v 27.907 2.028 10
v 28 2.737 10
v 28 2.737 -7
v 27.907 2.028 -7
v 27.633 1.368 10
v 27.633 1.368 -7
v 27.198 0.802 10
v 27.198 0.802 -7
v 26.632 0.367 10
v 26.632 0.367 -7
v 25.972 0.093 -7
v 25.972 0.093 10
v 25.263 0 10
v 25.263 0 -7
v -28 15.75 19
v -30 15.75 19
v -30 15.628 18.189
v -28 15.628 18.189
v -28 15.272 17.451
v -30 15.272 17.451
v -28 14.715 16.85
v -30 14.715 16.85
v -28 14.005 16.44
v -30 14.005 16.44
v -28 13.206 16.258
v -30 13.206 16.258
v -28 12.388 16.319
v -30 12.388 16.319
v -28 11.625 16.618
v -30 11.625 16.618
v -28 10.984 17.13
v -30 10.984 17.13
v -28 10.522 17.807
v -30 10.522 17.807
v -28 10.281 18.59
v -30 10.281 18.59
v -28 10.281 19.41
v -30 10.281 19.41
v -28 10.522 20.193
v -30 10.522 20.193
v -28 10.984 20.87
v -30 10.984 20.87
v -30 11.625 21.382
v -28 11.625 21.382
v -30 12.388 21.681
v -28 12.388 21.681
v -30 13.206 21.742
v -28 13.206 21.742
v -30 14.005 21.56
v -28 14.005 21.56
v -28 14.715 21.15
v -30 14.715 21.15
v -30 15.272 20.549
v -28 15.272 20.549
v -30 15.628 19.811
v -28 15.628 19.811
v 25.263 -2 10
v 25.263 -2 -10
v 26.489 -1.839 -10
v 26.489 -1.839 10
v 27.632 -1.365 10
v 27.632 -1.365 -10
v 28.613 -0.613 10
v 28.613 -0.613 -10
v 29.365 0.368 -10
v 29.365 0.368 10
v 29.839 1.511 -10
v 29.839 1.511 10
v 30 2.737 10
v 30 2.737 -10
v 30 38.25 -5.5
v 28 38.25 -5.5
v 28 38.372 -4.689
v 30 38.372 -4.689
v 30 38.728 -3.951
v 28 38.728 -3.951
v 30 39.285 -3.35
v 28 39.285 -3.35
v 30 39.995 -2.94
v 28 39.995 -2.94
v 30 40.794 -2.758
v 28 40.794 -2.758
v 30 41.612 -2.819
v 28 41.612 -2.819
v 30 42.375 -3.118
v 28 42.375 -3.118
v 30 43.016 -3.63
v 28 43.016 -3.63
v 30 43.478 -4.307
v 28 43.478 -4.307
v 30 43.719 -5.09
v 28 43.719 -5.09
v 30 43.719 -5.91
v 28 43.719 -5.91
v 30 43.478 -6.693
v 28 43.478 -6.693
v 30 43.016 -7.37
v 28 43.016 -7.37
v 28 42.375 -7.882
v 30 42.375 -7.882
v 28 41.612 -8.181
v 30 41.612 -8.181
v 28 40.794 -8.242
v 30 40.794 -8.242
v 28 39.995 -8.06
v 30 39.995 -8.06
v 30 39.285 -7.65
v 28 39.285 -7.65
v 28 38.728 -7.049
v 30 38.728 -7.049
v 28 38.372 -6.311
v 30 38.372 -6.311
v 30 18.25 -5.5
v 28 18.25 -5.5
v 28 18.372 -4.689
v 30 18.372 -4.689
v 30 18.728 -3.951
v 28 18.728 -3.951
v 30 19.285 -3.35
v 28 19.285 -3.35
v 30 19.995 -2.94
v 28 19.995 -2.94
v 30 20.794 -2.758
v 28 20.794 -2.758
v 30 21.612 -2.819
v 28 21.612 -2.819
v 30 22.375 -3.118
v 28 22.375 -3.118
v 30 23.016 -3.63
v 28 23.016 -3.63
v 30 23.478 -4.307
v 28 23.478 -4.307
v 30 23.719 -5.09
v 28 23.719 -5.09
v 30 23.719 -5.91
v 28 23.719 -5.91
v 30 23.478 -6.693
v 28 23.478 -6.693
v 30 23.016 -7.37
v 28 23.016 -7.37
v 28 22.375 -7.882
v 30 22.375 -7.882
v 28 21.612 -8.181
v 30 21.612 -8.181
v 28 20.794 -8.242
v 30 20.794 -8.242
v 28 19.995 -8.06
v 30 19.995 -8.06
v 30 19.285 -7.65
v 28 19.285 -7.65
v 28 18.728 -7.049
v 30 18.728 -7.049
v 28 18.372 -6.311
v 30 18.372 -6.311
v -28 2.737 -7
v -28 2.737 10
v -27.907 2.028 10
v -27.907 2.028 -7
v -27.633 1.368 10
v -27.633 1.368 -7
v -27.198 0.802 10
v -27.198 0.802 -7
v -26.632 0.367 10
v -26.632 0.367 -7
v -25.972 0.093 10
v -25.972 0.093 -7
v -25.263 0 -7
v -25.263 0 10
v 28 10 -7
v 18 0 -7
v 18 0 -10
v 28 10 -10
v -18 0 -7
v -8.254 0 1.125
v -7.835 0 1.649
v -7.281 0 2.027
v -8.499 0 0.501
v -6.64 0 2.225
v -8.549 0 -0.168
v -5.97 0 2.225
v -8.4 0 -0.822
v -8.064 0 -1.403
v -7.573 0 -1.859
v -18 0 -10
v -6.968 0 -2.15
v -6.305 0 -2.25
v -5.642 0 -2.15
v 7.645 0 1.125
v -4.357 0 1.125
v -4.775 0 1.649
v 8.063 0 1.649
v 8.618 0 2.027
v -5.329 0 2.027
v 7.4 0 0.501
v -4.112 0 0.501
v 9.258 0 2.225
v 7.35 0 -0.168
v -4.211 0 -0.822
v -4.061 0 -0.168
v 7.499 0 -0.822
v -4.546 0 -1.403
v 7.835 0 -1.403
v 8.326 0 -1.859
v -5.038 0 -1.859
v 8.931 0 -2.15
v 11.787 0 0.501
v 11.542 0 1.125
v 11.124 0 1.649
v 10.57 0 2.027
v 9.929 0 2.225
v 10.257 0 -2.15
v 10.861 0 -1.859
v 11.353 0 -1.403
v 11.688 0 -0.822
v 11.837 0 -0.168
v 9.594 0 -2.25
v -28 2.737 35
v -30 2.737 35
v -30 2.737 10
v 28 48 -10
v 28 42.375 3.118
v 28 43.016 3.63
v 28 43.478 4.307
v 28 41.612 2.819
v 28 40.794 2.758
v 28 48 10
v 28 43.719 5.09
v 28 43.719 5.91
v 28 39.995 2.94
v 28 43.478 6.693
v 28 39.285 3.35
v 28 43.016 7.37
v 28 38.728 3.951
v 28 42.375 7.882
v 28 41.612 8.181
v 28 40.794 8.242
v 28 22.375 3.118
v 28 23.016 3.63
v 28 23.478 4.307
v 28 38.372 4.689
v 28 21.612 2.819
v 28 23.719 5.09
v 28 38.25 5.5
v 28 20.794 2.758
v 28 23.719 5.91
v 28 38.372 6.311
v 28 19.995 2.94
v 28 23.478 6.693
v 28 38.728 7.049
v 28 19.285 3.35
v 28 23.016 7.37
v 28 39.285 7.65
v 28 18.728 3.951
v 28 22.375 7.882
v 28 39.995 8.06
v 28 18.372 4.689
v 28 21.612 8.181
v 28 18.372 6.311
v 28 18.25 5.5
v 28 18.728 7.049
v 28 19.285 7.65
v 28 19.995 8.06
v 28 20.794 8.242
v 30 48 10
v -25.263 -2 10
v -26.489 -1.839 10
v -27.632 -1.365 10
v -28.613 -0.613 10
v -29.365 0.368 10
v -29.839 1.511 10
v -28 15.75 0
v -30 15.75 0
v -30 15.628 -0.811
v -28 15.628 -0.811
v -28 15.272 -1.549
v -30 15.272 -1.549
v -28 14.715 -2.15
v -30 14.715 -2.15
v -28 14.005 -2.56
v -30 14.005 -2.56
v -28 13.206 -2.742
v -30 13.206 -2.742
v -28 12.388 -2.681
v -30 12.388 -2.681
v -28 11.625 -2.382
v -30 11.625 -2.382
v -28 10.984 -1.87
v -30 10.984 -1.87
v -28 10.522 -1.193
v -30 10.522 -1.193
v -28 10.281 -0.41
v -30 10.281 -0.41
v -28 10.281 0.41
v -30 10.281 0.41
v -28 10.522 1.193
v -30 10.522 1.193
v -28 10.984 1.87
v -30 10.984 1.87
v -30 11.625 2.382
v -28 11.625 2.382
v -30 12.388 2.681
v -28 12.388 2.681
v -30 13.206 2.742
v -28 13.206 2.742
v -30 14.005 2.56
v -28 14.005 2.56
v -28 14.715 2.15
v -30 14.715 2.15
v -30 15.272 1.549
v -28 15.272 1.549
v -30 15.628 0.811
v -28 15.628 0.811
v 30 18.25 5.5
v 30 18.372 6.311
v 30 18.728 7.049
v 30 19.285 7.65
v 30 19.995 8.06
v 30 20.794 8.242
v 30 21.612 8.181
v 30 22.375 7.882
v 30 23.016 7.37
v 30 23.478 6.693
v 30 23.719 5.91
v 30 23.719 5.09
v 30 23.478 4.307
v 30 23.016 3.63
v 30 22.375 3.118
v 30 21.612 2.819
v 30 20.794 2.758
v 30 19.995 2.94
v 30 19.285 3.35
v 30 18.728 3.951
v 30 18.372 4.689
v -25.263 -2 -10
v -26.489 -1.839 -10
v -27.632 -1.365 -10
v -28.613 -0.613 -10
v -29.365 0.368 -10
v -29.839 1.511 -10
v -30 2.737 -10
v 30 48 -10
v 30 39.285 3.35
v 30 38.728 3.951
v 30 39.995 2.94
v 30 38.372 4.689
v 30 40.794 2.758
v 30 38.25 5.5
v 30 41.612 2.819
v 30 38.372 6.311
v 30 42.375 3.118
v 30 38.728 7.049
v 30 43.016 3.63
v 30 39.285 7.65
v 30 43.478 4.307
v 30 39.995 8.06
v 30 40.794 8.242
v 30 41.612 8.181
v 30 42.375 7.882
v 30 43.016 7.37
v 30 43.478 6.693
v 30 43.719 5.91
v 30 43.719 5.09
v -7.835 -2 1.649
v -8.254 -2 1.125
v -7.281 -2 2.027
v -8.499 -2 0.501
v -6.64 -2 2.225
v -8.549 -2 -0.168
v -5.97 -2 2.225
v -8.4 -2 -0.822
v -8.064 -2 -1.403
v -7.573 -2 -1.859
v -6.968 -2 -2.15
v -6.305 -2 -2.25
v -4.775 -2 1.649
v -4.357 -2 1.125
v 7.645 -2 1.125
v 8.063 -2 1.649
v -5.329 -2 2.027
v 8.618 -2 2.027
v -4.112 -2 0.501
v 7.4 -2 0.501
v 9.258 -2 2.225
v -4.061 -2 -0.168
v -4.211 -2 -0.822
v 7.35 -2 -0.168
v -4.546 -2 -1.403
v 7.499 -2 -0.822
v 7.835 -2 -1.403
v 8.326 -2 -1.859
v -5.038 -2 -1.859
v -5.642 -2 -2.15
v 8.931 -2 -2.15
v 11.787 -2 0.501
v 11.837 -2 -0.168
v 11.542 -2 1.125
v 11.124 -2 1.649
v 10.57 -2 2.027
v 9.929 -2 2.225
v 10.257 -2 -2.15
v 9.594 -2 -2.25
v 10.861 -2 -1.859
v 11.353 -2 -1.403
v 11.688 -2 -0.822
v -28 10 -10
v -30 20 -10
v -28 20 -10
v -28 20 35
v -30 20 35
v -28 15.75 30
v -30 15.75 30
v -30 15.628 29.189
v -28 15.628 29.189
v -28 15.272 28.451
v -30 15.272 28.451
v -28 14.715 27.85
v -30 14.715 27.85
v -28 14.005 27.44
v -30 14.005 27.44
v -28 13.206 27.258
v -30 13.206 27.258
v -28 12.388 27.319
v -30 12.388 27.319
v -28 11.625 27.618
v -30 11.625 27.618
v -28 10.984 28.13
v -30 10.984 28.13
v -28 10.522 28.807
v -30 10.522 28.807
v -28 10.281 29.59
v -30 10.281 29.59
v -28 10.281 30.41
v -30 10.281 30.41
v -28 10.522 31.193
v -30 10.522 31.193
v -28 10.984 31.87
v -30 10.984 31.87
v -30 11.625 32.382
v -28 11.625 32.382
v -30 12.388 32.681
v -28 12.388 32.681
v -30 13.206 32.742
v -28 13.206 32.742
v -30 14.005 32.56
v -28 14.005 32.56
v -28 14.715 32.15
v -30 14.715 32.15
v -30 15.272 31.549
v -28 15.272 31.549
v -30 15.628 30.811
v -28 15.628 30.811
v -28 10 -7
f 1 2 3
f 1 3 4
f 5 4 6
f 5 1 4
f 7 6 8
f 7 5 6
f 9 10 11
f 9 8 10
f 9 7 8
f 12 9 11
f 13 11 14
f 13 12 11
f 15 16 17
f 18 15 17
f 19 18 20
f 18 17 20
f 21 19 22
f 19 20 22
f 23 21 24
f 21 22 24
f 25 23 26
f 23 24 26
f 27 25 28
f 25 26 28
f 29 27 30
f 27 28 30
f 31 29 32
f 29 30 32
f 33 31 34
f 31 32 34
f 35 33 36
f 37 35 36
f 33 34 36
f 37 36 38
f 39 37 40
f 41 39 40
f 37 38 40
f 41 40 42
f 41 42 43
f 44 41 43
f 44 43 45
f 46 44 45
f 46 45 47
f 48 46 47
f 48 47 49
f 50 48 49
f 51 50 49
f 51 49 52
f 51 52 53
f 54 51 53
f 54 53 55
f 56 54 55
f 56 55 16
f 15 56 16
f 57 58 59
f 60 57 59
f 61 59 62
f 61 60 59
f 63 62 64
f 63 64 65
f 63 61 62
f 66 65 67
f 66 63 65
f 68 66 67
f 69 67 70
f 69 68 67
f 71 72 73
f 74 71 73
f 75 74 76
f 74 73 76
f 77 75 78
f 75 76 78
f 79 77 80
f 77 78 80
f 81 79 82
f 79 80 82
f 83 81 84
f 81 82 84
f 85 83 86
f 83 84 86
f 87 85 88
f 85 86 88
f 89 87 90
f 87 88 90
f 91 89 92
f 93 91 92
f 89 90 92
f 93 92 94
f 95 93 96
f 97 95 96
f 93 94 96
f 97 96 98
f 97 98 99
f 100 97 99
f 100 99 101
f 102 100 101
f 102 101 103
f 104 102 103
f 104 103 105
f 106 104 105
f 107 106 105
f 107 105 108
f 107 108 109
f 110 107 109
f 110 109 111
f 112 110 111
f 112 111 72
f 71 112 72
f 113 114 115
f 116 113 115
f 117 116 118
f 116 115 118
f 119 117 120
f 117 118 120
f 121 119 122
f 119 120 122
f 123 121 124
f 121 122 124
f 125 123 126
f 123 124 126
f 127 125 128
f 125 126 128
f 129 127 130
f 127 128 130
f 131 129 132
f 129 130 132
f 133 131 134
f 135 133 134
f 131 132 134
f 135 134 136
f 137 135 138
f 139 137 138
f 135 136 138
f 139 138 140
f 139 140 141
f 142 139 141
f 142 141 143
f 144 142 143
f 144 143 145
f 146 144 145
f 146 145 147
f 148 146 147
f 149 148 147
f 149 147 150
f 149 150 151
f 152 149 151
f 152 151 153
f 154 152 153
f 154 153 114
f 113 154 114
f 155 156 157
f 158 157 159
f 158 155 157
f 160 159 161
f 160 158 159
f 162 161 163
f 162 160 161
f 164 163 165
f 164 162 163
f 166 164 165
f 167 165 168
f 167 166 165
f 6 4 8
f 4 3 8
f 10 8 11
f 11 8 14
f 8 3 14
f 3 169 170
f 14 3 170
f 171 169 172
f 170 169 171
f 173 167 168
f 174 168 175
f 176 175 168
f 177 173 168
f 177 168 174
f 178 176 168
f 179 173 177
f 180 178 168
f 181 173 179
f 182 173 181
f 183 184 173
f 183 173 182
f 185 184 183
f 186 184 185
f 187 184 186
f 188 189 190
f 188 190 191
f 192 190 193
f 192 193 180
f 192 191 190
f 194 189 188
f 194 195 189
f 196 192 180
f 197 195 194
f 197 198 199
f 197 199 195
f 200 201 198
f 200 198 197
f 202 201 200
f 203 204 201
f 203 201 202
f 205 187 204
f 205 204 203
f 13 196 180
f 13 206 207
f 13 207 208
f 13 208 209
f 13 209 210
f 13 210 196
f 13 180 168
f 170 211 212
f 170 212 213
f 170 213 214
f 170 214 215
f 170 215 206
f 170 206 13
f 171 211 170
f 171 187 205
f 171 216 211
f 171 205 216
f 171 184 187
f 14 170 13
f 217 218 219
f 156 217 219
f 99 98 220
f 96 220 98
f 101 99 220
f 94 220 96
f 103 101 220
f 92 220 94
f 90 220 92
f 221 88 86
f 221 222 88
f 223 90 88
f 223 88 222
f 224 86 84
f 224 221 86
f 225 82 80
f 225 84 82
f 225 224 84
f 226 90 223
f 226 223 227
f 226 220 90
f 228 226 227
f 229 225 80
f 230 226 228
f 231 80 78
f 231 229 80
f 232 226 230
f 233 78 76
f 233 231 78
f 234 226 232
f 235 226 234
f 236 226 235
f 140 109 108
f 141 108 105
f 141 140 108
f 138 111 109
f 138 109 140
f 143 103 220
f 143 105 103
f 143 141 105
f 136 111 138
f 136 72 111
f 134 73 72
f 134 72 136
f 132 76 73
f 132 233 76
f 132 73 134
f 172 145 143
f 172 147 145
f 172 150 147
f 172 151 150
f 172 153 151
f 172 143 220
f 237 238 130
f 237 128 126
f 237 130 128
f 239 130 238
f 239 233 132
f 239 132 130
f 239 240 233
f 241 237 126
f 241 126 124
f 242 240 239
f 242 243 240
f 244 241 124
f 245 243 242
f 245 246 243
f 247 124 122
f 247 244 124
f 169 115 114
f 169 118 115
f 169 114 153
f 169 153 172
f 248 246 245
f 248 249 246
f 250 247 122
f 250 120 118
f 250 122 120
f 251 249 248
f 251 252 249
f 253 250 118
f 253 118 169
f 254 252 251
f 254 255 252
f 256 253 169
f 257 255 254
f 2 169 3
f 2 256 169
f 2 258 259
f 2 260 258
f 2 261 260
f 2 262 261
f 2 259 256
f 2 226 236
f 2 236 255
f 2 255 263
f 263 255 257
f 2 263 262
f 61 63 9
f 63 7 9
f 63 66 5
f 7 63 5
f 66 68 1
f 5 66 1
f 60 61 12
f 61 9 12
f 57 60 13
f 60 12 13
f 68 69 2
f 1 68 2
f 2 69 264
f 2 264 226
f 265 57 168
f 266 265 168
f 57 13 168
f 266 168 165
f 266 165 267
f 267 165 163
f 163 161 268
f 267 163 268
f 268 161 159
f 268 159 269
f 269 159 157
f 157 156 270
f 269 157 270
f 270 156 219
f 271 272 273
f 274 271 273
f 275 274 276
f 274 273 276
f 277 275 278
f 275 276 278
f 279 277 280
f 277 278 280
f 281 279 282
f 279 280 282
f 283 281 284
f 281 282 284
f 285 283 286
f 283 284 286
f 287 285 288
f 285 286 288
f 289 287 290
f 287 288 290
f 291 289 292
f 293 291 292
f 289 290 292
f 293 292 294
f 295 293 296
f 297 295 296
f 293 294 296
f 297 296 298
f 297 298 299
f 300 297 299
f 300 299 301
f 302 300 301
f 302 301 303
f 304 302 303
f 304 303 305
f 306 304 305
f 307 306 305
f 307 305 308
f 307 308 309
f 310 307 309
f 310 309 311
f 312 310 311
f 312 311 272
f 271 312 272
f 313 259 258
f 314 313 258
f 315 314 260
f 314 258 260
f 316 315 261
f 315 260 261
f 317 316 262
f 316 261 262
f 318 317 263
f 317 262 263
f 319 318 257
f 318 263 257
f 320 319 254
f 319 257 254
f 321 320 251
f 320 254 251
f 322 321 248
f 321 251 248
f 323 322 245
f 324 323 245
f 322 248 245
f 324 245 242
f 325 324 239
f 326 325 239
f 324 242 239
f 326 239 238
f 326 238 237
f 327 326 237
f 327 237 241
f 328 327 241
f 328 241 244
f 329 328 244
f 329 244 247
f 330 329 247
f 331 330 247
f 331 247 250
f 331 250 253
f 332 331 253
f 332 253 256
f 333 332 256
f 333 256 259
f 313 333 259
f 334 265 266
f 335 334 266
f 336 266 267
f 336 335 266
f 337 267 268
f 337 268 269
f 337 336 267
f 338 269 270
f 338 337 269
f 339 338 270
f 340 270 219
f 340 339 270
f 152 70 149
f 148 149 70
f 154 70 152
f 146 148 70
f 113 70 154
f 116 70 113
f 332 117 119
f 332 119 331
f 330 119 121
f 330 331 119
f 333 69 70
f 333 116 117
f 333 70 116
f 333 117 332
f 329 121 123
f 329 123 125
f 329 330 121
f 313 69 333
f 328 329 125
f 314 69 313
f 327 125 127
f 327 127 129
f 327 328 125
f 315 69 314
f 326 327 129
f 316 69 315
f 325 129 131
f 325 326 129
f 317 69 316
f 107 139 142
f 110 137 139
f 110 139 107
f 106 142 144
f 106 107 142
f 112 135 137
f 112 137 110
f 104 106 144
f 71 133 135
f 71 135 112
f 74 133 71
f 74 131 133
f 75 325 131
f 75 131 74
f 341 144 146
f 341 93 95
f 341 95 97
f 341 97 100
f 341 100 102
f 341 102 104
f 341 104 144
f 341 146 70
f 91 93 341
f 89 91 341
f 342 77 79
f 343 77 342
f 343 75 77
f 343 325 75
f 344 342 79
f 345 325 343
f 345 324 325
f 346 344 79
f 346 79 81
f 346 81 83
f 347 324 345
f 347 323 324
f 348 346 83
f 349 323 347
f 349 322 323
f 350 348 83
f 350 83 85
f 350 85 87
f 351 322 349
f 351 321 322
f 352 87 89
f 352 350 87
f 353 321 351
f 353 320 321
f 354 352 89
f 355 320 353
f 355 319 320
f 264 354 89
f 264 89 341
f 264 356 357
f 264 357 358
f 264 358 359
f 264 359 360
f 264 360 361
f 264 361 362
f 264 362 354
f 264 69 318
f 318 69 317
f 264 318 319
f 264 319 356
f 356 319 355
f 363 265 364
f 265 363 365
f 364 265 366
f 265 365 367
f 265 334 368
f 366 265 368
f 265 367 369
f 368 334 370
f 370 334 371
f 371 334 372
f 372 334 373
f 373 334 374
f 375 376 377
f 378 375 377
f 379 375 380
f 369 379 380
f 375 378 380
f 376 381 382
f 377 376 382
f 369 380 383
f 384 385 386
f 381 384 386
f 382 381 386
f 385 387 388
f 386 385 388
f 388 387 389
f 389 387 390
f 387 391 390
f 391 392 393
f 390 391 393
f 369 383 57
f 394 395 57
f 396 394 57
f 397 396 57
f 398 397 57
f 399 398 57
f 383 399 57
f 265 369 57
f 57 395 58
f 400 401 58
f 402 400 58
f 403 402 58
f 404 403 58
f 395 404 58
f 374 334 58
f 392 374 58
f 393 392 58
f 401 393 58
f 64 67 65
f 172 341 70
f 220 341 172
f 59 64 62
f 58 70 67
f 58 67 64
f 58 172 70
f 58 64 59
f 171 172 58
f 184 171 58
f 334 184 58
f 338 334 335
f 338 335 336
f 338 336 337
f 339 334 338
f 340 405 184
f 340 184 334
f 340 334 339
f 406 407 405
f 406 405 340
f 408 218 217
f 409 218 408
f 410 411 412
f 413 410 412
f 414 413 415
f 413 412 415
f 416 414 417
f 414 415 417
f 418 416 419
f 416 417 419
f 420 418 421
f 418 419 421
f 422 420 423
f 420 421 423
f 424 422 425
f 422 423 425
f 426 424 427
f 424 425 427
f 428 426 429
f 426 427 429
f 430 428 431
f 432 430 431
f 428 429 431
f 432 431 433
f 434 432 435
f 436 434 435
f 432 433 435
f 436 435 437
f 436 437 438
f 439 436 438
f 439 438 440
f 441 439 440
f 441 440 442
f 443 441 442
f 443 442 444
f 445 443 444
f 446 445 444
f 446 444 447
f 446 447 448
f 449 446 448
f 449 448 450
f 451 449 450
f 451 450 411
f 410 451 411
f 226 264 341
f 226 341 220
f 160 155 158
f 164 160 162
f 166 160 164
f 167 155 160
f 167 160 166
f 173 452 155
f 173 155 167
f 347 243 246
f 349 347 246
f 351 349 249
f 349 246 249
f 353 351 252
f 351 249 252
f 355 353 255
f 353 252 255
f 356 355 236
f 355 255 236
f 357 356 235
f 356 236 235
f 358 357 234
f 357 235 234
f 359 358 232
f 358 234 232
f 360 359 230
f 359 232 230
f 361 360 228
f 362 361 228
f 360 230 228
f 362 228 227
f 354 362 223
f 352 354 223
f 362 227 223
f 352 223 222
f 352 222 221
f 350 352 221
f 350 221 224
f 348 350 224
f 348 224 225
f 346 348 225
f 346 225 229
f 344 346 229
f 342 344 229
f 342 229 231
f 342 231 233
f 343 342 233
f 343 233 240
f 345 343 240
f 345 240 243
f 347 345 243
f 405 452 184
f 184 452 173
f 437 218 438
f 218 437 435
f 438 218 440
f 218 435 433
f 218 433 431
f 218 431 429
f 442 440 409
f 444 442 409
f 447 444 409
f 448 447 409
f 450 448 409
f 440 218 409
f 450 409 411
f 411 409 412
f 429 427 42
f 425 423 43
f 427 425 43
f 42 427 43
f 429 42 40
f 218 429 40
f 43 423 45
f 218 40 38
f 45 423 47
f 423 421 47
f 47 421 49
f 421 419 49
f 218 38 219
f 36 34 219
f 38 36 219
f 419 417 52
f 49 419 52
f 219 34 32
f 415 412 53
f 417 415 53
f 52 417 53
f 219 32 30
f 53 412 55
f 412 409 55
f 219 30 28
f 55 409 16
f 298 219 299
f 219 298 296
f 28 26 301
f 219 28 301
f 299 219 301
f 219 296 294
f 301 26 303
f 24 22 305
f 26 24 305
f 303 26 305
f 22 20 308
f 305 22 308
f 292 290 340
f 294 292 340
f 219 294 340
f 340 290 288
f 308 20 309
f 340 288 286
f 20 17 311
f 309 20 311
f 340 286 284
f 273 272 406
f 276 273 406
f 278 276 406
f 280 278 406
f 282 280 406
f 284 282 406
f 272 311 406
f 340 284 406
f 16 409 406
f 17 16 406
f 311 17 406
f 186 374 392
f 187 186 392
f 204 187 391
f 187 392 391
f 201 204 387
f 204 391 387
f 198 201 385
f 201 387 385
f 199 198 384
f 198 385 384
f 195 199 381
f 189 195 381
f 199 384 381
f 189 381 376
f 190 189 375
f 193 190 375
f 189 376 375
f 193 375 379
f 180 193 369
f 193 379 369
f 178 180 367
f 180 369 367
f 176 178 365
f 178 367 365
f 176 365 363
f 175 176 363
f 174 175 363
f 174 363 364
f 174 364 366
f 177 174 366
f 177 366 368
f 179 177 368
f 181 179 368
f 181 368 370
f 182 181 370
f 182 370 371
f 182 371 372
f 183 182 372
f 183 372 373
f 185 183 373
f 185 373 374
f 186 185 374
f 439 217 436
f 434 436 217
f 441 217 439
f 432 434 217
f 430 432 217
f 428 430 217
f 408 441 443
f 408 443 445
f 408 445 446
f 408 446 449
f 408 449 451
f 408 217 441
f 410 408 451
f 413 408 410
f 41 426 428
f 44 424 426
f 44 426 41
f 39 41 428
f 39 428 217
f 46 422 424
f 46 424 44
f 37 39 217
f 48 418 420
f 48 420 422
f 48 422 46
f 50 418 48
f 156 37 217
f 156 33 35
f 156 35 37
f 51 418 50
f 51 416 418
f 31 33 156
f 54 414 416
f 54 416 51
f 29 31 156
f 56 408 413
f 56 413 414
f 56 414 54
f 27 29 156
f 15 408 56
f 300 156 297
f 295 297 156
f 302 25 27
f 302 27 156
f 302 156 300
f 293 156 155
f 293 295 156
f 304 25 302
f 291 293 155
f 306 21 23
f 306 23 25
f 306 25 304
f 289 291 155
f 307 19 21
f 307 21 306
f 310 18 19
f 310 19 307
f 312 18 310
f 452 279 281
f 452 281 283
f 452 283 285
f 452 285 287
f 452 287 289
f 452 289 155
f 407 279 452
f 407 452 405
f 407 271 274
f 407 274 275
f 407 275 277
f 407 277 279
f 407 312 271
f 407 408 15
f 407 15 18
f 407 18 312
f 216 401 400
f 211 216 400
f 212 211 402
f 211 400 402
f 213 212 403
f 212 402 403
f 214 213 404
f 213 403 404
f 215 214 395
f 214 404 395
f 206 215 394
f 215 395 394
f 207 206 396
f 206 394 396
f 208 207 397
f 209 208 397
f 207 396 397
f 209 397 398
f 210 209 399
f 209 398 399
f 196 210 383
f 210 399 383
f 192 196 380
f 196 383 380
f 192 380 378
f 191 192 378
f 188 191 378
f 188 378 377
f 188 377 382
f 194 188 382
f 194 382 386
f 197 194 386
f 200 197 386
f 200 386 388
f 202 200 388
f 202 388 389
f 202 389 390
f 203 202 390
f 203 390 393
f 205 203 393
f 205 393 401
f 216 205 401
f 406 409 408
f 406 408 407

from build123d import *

# Parameters (mm, degrees)
SKETCH_1_W                         = 60
SKETCH_1_H                         = 20
SM_BASE_FLANGE_1_DEPTH             = 2
SM_EDGE_FLANGE_1_STRIP_W           = 13.4732
SM_EDGE_FLANGE_1_STRIP_H           = 2
SM_EDGE_FLANGE_1_STRIP_CUT_DEPTH   = 20
SM_EDGE_FLANGE_1_STRIP_2_W         = 13.4732
SM_EDGE_FLANGE_1_STRIP_2_H         = 2
SM_EDGE_FLANGE_1_STRIP_CUT_2_DEPTH = 20
SM_EDGE_FLANGE_1_DEPTH             = 20
SM_EDGE_FLANGE_1_BEND_DEPTH        = 20
SM_EDGE_FLANGE_1_PROFILE_W         = 45
SM_EDGE_FLANGE_1_PROFILE_H         = 17.2634
SM_EDGE_FLANGE_1_FLAT_DEPTH        = 2
RIB_2_REACH                        = 74.312
SKETCH_12_WALL_W                   = 160.765785142
SKETCH_12_WALL_H                   = 3
CUT_EXTRUDE_1_REACH                = 86.433
SKETCH_13_R                        = 2.75
CUT_EXTRUDE_1_DIRECTION_2_DEPTH    = 85.433405711
SKETCH_15_R                        = 2.75
CUT_EXTRUDE_2_DEPTH                = 10
SKETCH_16_R                        = 2.25
CUT_EXTRUDE_3_DEPTH                = 10


# Sheet-metal steps are written as plain solids
with BuildPart() as part:
    # Sketch 1 → 基体-法兰1 (new body)
    with BuildSketch(Plane(origin=(0, 0, 0), x_dir=(1, 0, 0), z_dir=(0, 1, 0))):
        Rectangle(SKETCH_1_W, SKETCH_1_H)
    extrude(amount=-SM_BASE_FLANGE_1_DEPTH)

    # 边线-法兰1 strip (across the edge) → 边线-法兰1 strip cut (cut)
    with BuildSketch(Plane(origin=(30, 0, 10), x_dir=(-1, 0, 0), z_dir=(0, 0, -1))):
        with Locations((-2, -1)):
            Rectangle(SM_EDGE_FLANGE_1_STRIP_W, SM_EDGE_FLANGE_1_STRIP_H)
    extrude(amount=SM_EDGE_FLANGE_1_STRIP_CUT_DEPTH, mode=Mode.SUBTRACT)

    # 边线-法兰1 strip 2 (across the edge) → 边线-法兰1 strip cut 2 (cut)
    with BuildSketch(Plane(origin=(-30, 0, -10), x_dir=(1, 0, 0), z_dir=(0, 0, 1))):
        with Locations((-2, -1)):
            Rectangle(SM_EDGE_FLANGE_1_STRIP_2_W, SM_EDGE_FLANGE_1_STRIP_2_H)
    extrude(amount=SM_EDGE_FLANGE_1_STRIP_CUT_2_DEPTH, mode=Mode.SUBTRACT)

    # 边线-法兰1 section (across the edge) → 边线-法兰1 (add)
    with BuildSketch(Plane(origin=(30, 0, 10), x_dir=(-1, 0, 0), z_dir=(0, 0, -1))):
        with BuildLine():
            Line((0, 2.7366), (0, 48))
            Line((0, 48), (2, 48))
            Line((2, 48), (2, 2.7366))
            ThreePointArc((2, 2.7366), (2.801531583, 0.801531583), (4.7366, 0))
            Line((4.7366, 0), (4.7366, -2))
            ThreePointArc((4.7366, -2), (1.38731802, -0.61268198), (0, 2.7366))
        make_face()
    extrude(amount=SM_EDGE_FLANGE_1_DEPTH)

    # 边线-法兰1 bend section (across the edge) → 边线-法兰1 bend (add)
    with BuildSketch(Plane(origin=(-30, 0, -10), x_dir=(1, 0, 0), z_dir=(0, 0, 1))):
        with BuildLine():
            Line((0, 2.7366), (2, 2.7366))
            ThreePointArc((2, 2.7366), (2.801531583, 0.801531583), (4.7366, 0))
            Line((4.7366, 0), (4.7366, -2))
            ThreePointArc((4.7366, -2), (1.38731802, -0.61268198), (0, 2.7366))
        make_face()
    extrude(amount=SM_EDGE_FLANGE_1_BEND_DEPTH)

    # 边线-法兰1 profile (on flange) → 边线-法兰1 flat (add)
    with BuildSketch(Plane(origin=(-30, 0, 0), x_dir=(0, 0, -1), z_dir=(1, 0, 0))):
        with Locations((-12.5, 11.3683)):
            Rectangle(SM_EDGE_FLANGE_1_PROFILE_W, SM_EDGE_FLANGE_1_PROFILE_H)
    extrude(amount=SM_EDGE_FLANGE_1_FLAT_DEPTH)

    # 草图12 wall → 筋2 (add, up to next)
    with BuildSketch(Plane(origin=(-23, 5, -10), x_dir=(0.707106781187, -0.707106781187, 0), z_dir=(-0.707106781187, -0.707106781187, 0)), mode=Mode.PRIVATE) as rib_2_sk1:
        with Locations((0, 1.5)):
            Rectangle(SKETCH_12_WALL_W, SKETCH_12_WALL_H)
    rib_2_tool1 = extrude(rib_2_sk1.sketch, amount=RIB_2_REACH, mode=Mode.PRIVATE) - part.part
    rib_2 = rib_2_tool1.solids().sort_by_distance((-23, 5, -10))[0]
    add(rib_2)

    # 镜向1: 筋2 across plane
    add(rib_2.mirror(Plane(origin=(0, 0, 0), x_dir=(0, 0, 1), z_dir=(1, 0, 0))))

    # 草图13 → 切除-拉伸1 (cut, up to next)
    with BuildSketch(Plane.ZY.offset(30), mode=Mode.PRIVATE) as cut_extrude_1_sk1:
        with Locations(Location((0, 13, 0), (0, 0, 90))):
            Circle(SKETCH_13_R)
    cut_extrude_1_tool1 = extrude(cut_extrude_1_sk1.sketch, amount=-CUT_EXTRUDE_1_REACH, mode=Mode.PRIVATE) & part.part
    # 草图13 → 切除-拉伸1 (cut, up to next)
    with BuildSketch(Plane.ZY.offset(30), mode=Mode.PRIVATE) as cut_extrude_1_sk2:
        with Locations(Location((19, 13, 0), (0, 0, 90))):
            Circle(SKETCH_13_R)
    cut_extrude_1_tool2 = extrude(cut_extrude_1_sk2.sketch, amount=-CUT_EXTRUDE_1_REACH, mode=Mode.PRIVATE) & part.part
    # 草图13 → 切除-拉伸1 (cut, up to next)
    with BuildSketch(Plane.ZY.offset(30), mode=Mode.PRIVATE) as cut_extrude_1_sk3:
        with Locations(Location((30, 13, 0), (0, 0, 90))):
            Circle(SKETCH_13_R)
    cut_extrude_1_tool3 = extrude(cut_extrude_1_sk3.sketch, amount=-CUT_EXTRUDE_1_REACH, mode=Mode.PRIVATE) & part.part
    add(cut_extrude_1_tool1.solids().sort_by_distance((-30, 13, 0))[0], mode=Mode.SUBTRACT)
    add(cut_extrude_1_tool2.solids().sort_by_distance((-30, 13, 19))[0], mode=Mode.SUBTRACT)
    add(cut_extrude_1_tool3.solids().sort_by_distance((-30, 13, 30))[0], mode=Mode.SUBTRACT)

    # 草图13 → 切除-拉伸1 direction 2 (cut)
    with BuildSketch(Plane.ZY.offset(30)):
        with Locations(Location((0, 13, 0), (0, 0, 90))):
            Circle(SKETCH_13_R)
        with Locations(Location((19, 13, 0), (0, 0, 90))):
            Circle(SKETCH_13_R)
        with Locations(Location((30, 13, 0), (0, 0, 90))):
            Circle(SKETCH_13_R)
    extrude(amount=CUT_EXTRUDE_1_DIRECTION_2_DEPTH, mode=Mode.SUBTRACT)

    # 草图15 → 切除-拉伸2 (cut)
    with BuildSketch(Plane.ZY.offset(-28)):
        with Locations(Location((-5.5, 21, 0), (0, 0, 270))):
            Circle(SKETCH_15_R)
        with Locations(Location((5.5, 21, 0), (0, 0, 270))):
            Circle(SKETCH_15_R)
        with Locations(Location((5.5, 41, 0), (0, 0, 270))):
            Circle(SKETCH_15_R)
        with Locations(Location((-5.5, 41, 0), (0, 0, 270))):
            Circle(SKETCH_15_R)
    extrude(amount=-CUT_EXTRUDE_2_DEPTH, mode=Mode.SUBTRACT)

    # 草图16 → 切除-拉伸3 (cut)
    with BuildSketch(Plane.XZ.offset(2)):
        with Locations(Location((9.593773501, 0, 0), (0, 0, 270))):
            Circle(SKETCH_16_R)
        with Locations(Location((-6.30510484, 0, 0), (0, 0, 270))):
            Circle(SKETCH_16_R)
    extrude(amount=-CUT_EXTRUDE_3_DEPTH, mode=Mode.SUBTRACT)


solid = part.part
